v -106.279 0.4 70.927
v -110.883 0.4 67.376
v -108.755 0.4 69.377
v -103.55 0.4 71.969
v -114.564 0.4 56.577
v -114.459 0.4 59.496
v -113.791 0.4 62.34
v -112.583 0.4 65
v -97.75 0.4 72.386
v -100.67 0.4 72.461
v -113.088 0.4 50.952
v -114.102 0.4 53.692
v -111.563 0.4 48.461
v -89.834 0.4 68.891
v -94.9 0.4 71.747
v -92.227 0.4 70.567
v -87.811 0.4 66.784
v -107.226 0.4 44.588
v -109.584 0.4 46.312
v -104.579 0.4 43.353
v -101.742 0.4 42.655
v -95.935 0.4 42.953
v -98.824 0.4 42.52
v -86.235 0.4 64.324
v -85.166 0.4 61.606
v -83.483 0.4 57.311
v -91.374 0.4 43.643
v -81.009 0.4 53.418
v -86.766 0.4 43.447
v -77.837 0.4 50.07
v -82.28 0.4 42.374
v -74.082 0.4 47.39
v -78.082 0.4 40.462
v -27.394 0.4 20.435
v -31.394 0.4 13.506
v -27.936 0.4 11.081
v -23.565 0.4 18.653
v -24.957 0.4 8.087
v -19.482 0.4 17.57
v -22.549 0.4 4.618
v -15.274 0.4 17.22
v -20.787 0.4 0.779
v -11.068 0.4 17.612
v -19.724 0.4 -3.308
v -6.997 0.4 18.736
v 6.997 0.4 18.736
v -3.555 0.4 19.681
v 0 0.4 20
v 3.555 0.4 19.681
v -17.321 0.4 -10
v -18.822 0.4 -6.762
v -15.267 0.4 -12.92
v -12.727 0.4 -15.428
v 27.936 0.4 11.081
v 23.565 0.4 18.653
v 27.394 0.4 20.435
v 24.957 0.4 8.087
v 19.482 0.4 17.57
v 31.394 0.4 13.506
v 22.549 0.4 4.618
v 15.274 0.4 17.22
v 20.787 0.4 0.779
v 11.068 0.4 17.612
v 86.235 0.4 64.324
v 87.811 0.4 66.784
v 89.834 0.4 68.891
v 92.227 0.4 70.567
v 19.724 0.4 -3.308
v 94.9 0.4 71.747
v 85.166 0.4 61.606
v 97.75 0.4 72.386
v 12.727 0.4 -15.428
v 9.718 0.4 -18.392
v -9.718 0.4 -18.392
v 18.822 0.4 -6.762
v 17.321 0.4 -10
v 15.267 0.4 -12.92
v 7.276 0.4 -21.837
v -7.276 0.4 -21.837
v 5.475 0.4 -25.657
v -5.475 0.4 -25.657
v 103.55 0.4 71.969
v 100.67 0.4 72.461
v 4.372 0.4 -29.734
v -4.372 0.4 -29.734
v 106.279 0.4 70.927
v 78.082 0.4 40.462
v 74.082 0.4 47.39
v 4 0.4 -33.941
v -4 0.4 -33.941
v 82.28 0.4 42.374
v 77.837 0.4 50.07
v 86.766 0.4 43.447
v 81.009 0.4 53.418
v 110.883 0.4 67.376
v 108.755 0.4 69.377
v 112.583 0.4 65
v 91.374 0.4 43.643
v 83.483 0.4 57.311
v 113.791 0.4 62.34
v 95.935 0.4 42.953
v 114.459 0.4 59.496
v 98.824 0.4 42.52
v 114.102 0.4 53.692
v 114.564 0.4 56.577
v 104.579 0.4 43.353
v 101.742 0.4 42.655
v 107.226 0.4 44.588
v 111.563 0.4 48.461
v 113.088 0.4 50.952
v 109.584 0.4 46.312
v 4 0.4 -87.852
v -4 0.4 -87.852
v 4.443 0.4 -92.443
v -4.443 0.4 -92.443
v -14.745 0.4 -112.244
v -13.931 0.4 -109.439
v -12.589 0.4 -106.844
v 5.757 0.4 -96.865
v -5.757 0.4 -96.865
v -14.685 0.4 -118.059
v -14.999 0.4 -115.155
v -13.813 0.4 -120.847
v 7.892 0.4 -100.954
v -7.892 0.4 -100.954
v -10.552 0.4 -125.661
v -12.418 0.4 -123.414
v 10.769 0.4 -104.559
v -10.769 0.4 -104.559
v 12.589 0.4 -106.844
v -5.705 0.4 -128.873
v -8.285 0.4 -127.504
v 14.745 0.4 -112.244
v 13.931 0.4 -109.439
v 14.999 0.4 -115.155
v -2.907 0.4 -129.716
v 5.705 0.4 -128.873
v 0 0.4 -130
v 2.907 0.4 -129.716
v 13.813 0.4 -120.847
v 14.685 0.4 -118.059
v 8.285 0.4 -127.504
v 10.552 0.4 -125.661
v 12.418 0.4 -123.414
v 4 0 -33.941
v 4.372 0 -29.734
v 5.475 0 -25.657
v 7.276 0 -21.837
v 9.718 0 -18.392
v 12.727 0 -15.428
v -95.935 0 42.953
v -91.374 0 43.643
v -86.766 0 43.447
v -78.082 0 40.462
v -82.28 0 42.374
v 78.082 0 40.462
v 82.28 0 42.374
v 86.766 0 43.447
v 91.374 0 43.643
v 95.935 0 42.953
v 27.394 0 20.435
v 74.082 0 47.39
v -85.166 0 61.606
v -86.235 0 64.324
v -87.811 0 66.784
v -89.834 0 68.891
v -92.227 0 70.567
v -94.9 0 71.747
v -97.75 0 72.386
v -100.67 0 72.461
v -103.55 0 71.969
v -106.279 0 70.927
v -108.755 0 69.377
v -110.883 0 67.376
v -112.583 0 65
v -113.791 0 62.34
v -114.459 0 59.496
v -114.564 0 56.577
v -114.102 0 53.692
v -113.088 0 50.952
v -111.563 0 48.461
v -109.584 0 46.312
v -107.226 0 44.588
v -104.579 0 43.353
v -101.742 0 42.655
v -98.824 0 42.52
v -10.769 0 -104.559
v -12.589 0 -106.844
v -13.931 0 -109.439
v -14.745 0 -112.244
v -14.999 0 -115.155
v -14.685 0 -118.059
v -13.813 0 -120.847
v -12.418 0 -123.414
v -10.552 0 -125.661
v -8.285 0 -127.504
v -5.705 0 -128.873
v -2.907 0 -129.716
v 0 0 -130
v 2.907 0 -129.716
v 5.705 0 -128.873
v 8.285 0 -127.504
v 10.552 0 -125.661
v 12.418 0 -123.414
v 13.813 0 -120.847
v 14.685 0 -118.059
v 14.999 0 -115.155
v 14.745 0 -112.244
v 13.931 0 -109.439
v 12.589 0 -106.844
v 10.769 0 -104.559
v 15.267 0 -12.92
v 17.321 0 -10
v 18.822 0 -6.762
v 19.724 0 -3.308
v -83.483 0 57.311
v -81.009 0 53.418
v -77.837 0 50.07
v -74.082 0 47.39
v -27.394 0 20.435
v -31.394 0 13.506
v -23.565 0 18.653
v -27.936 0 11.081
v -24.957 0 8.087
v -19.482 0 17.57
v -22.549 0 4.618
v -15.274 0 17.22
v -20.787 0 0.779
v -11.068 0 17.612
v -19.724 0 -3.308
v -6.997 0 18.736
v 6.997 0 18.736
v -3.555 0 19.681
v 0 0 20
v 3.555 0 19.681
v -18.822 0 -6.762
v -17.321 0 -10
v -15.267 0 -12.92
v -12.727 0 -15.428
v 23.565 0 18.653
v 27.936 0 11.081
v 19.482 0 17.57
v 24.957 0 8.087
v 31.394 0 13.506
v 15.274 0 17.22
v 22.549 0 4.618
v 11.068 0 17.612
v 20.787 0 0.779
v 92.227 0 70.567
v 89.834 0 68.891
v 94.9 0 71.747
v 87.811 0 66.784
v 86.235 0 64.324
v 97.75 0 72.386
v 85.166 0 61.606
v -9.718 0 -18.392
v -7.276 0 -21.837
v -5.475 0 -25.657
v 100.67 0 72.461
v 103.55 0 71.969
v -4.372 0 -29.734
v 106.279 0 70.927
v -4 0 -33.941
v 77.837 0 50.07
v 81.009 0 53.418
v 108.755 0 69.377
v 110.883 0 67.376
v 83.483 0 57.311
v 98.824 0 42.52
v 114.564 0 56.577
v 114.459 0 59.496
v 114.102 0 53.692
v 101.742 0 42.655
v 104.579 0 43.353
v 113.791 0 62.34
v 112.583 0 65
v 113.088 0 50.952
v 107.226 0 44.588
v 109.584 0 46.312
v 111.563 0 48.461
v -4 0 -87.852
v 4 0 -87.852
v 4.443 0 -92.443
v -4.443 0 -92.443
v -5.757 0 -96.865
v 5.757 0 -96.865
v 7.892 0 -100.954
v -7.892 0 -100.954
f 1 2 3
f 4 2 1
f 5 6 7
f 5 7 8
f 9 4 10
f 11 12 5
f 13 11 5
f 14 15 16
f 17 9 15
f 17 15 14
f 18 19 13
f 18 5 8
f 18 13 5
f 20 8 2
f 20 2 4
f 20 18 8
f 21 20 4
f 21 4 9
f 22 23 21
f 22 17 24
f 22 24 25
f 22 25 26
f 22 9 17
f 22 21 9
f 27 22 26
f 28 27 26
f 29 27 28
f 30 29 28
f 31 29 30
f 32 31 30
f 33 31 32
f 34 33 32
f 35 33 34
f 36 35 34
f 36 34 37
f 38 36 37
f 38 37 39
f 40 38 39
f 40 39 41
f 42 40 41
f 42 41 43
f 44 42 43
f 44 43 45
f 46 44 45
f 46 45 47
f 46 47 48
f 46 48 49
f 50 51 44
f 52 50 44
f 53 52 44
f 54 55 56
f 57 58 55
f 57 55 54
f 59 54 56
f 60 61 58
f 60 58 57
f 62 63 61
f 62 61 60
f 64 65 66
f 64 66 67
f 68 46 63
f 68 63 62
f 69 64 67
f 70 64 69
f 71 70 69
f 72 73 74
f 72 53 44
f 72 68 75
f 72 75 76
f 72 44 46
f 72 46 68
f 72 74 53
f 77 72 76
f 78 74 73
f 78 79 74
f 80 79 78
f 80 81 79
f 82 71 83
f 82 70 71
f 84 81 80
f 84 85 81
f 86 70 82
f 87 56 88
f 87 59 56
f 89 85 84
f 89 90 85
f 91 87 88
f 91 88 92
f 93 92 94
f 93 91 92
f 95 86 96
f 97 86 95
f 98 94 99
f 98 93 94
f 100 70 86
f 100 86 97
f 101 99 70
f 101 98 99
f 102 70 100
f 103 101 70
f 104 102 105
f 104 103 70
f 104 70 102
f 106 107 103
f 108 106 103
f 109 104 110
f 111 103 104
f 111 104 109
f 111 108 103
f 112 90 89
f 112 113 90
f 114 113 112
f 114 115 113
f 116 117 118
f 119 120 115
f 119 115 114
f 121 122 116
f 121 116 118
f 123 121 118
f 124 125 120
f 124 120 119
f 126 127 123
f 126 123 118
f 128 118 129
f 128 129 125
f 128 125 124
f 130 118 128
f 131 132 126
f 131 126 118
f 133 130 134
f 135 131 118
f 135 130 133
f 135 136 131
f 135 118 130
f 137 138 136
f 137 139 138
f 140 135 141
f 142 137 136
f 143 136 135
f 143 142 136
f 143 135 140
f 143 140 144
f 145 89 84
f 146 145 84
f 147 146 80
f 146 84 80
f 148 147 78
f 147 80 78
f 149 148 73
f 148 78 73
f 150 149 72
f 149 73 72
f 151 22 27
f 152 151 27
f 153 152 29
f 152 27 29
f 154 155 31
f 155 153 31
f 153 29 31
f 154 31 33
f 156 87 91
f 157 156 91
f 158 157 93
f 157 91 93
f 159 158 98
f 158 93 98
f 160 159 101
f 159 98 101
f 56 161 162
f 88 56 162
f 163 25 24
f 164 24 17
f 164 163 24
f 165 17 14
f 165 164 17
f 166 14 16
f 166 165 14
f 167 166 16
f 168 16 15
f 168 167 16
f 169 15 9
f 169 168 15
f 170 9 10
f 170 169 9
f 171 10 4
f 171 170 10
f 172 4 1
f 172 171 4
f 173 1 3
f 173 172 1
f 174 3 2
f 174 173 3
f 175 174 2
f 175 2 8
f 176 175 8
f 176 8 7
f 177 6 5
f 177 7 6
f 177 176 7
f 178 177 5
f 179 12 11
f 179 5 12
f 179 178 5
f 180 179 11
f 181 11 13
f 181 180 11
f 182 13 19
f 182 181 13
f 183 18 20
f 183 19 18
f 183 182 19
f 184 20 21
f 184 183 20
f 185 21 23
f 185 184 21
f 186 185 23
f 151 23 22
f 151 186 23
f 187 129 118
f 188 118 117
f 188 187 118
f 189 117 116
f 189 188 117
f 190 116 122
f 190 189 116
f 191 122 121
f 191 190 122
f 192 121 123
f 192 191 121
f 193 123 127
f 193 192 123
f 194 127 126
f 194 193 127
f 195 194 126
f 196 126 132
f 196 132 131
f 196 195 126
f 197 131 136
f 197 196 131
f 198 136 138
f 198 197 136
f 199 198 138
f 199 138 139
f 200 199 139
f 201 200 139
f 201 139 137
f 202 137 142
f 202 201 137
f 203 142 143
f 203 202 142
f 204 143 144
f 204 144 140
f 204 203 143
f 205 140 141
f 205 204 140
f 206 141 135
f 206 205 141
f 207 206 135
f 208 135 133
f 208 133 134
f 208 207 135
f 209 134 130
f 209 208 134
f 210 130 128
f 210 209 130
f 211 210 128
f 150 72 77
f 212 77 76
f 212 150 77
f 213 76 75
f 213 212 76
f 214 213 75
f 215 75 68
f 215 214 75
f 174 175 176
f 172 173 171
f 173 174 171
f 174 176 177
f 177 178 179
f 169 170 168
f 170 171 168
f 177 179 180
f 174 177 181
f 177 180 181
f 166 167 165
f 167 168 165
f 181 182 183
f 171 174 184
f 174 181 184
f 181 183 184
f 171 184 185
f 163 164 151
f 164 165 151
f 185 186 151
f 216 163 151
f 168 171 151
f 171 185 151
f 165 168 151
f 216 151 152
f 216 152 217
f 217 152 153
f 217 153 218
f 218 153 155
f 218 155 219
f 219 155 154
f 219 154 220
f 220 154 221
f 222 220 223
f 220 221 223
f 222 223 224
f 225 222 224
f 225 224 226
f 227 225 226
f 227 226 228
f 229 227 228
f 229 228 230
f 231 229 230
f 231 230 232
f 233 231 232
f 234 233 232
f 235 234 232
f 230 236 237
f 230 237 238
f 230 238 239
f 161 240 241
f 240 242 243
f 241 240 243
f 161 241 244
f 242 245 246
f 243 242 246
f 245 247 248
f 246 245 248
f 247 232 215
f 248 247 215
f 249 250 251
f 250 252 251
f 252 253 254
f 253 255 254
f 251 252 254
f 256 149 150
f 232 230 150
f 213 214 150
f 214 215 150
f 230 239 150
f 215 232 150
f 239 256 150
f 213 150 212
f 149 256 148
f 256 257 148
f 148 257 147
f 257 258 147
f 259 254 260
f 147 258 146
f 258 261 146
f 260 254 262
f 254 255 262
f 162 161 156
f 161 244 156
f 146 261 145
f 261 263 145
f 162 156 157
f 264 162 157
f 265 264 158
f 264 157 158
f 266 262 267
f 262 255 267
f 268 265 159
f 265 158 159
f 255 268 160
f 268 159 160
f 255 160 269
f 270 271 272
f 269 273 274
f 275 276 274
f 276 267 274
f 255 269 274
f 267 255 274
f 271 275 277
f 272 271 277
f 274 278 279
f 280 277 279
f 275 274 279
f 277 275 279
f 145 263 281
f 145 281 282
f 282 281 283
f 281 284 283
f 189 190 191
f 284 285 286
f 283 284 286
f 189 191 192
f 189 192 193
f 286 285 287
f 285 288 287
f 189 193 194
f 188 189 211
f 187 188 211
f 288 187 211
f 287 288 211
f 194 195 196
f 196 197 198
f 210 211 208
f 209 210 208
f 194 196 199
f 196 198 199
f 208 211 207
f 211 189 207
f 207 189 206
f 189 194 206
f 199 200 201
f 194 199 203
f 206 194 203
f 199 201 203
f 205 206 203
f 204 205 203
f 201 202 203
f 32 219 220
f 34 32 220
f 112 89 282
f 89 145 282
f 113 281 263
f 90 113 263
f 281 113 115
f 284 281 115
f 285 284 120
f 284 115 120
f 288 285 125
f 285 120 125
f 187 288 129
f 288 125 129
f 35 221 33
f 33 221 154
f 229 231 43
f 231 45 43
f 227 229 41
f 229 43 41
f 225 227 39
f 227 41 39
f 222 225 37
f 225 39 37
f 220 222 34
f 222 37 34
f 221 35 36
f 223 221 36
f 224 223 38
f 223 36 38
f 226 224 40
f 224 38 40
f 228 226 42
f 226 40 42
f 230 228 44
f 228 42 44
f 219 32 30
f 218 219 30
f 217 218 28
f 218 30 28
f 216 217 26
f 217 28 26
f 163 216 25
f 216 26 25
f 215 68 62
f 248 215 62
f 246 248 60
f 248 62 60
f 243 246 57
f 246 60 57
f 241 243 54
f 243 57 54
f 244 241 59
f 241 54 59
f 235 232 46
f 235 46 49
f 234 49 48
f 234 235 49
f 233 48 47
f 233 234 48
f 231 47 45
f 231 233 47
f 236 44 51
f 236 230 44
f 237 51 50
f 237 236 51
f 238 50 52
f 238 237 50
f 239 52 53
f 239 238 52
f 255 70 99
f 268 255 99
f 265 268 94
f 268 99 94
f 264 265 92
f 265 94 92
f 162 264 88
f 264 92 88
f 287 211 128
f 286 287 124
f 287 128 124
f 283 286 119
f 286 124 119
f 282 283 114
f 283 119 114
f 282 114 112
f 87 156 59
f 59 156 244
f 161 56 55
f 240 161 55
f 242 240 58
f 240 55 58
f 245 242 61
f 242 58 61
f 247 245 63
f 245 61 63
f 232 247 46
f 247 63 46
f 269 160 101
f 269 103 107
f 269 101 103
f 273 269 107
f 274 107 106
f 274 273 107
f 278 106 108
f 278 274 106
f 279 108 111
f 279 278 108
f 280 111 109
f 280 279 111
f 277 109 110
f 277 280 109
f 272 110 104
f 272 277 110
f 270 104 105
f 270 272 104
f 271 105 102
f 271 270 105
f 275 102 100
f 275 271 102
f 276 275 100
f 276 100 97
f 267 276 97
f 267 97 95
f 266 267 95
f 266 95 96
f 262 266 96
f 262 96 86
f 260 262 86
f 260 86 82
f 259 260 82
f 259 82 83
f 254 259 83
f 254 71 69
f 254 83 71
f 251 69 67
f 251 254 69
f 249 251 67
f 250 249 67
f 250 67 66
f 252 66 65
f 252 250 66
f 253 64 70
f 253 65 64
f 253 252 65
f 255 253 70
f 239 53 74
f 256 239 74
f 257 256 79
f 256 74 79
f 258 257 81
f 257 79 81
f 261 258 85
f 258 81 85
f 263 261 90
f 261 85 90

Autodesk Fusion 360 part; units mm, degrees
sketch "Sketch1" plane through (0, 0, 0) normal (0, 1, 0) x (1, 0, 0)
  line L0 (0, 130) -> (-112.5833, -65) construction
  line L1 (-112.5833, -65) -> (112.5833, -65) construction
  line L2 (112.5833, -65) -> (0, 130) construction
  line L3 (0, 0) -> (0, 130) construction
  line L4 (0, 0) -> (-112.5833, -65) construction
  line L5 (0, 0) -> (112.5833, -65) construction
  circle A0 centre (0, 115) radius 15
  circle A1 centre (-99.5929, -57.5) radius 15
  circle A2 centre (99.5929, -57.5) radius 15
  circle A3 centre (0, 0) radius 20
  line L6 (-4, 19.5959) -> (4, 19.5959) construction
  line L7 (4, 19.5959) -> (4, 100.5432)
  line L8 (4, 100.5432) -> (-4, 100.5432) construction
  line L9 (-4, 100.5432) -> (-4, 19.5959)
  line L10 (-85.0729, -53.7357) -> (-14.9706, -13.2621)
  line L11 (-18.9706, -6.3339) -> (-89.0729, -46.8075)
  line L12 (89.0729, -46.8075) -> (18.9706, -6.3339)
  line L13 (14.9706, -13.2621) -> (85.0729, -53.7357)
  point P0 (0, 100.5432)
  point P1 (0, 19.5959)
  dimension "d1" = 130
  dimension "d2" = 30
  dimension "d4" = 360
  dimension "d5" = 40
  dimension "d6" = 8
  dimension "d8" = 360
extrude "Extrude1" add sketch "Sketch1" along normal blind 0.4
fillet "Fillet1" radius 24 12 edges at (-4, 0.2, -100.5432) (4, 0.2, -100.5432) (-4, 0.2, -19.5959) (4, 0.2, -19.5959) (-18.9706, 0.2, 6.3339) (-14.9706, 0.2, 13.2621) (14.9706, 0.2, 13.2621) (18.9706, 0.2, 6.3339) (85.0729, 0.2, 53.7357) (89.0729, 0.2, 46.8075) (-89.0729, 0.2, 46.8075) (-85.0729, 0.2, 53.7357)
